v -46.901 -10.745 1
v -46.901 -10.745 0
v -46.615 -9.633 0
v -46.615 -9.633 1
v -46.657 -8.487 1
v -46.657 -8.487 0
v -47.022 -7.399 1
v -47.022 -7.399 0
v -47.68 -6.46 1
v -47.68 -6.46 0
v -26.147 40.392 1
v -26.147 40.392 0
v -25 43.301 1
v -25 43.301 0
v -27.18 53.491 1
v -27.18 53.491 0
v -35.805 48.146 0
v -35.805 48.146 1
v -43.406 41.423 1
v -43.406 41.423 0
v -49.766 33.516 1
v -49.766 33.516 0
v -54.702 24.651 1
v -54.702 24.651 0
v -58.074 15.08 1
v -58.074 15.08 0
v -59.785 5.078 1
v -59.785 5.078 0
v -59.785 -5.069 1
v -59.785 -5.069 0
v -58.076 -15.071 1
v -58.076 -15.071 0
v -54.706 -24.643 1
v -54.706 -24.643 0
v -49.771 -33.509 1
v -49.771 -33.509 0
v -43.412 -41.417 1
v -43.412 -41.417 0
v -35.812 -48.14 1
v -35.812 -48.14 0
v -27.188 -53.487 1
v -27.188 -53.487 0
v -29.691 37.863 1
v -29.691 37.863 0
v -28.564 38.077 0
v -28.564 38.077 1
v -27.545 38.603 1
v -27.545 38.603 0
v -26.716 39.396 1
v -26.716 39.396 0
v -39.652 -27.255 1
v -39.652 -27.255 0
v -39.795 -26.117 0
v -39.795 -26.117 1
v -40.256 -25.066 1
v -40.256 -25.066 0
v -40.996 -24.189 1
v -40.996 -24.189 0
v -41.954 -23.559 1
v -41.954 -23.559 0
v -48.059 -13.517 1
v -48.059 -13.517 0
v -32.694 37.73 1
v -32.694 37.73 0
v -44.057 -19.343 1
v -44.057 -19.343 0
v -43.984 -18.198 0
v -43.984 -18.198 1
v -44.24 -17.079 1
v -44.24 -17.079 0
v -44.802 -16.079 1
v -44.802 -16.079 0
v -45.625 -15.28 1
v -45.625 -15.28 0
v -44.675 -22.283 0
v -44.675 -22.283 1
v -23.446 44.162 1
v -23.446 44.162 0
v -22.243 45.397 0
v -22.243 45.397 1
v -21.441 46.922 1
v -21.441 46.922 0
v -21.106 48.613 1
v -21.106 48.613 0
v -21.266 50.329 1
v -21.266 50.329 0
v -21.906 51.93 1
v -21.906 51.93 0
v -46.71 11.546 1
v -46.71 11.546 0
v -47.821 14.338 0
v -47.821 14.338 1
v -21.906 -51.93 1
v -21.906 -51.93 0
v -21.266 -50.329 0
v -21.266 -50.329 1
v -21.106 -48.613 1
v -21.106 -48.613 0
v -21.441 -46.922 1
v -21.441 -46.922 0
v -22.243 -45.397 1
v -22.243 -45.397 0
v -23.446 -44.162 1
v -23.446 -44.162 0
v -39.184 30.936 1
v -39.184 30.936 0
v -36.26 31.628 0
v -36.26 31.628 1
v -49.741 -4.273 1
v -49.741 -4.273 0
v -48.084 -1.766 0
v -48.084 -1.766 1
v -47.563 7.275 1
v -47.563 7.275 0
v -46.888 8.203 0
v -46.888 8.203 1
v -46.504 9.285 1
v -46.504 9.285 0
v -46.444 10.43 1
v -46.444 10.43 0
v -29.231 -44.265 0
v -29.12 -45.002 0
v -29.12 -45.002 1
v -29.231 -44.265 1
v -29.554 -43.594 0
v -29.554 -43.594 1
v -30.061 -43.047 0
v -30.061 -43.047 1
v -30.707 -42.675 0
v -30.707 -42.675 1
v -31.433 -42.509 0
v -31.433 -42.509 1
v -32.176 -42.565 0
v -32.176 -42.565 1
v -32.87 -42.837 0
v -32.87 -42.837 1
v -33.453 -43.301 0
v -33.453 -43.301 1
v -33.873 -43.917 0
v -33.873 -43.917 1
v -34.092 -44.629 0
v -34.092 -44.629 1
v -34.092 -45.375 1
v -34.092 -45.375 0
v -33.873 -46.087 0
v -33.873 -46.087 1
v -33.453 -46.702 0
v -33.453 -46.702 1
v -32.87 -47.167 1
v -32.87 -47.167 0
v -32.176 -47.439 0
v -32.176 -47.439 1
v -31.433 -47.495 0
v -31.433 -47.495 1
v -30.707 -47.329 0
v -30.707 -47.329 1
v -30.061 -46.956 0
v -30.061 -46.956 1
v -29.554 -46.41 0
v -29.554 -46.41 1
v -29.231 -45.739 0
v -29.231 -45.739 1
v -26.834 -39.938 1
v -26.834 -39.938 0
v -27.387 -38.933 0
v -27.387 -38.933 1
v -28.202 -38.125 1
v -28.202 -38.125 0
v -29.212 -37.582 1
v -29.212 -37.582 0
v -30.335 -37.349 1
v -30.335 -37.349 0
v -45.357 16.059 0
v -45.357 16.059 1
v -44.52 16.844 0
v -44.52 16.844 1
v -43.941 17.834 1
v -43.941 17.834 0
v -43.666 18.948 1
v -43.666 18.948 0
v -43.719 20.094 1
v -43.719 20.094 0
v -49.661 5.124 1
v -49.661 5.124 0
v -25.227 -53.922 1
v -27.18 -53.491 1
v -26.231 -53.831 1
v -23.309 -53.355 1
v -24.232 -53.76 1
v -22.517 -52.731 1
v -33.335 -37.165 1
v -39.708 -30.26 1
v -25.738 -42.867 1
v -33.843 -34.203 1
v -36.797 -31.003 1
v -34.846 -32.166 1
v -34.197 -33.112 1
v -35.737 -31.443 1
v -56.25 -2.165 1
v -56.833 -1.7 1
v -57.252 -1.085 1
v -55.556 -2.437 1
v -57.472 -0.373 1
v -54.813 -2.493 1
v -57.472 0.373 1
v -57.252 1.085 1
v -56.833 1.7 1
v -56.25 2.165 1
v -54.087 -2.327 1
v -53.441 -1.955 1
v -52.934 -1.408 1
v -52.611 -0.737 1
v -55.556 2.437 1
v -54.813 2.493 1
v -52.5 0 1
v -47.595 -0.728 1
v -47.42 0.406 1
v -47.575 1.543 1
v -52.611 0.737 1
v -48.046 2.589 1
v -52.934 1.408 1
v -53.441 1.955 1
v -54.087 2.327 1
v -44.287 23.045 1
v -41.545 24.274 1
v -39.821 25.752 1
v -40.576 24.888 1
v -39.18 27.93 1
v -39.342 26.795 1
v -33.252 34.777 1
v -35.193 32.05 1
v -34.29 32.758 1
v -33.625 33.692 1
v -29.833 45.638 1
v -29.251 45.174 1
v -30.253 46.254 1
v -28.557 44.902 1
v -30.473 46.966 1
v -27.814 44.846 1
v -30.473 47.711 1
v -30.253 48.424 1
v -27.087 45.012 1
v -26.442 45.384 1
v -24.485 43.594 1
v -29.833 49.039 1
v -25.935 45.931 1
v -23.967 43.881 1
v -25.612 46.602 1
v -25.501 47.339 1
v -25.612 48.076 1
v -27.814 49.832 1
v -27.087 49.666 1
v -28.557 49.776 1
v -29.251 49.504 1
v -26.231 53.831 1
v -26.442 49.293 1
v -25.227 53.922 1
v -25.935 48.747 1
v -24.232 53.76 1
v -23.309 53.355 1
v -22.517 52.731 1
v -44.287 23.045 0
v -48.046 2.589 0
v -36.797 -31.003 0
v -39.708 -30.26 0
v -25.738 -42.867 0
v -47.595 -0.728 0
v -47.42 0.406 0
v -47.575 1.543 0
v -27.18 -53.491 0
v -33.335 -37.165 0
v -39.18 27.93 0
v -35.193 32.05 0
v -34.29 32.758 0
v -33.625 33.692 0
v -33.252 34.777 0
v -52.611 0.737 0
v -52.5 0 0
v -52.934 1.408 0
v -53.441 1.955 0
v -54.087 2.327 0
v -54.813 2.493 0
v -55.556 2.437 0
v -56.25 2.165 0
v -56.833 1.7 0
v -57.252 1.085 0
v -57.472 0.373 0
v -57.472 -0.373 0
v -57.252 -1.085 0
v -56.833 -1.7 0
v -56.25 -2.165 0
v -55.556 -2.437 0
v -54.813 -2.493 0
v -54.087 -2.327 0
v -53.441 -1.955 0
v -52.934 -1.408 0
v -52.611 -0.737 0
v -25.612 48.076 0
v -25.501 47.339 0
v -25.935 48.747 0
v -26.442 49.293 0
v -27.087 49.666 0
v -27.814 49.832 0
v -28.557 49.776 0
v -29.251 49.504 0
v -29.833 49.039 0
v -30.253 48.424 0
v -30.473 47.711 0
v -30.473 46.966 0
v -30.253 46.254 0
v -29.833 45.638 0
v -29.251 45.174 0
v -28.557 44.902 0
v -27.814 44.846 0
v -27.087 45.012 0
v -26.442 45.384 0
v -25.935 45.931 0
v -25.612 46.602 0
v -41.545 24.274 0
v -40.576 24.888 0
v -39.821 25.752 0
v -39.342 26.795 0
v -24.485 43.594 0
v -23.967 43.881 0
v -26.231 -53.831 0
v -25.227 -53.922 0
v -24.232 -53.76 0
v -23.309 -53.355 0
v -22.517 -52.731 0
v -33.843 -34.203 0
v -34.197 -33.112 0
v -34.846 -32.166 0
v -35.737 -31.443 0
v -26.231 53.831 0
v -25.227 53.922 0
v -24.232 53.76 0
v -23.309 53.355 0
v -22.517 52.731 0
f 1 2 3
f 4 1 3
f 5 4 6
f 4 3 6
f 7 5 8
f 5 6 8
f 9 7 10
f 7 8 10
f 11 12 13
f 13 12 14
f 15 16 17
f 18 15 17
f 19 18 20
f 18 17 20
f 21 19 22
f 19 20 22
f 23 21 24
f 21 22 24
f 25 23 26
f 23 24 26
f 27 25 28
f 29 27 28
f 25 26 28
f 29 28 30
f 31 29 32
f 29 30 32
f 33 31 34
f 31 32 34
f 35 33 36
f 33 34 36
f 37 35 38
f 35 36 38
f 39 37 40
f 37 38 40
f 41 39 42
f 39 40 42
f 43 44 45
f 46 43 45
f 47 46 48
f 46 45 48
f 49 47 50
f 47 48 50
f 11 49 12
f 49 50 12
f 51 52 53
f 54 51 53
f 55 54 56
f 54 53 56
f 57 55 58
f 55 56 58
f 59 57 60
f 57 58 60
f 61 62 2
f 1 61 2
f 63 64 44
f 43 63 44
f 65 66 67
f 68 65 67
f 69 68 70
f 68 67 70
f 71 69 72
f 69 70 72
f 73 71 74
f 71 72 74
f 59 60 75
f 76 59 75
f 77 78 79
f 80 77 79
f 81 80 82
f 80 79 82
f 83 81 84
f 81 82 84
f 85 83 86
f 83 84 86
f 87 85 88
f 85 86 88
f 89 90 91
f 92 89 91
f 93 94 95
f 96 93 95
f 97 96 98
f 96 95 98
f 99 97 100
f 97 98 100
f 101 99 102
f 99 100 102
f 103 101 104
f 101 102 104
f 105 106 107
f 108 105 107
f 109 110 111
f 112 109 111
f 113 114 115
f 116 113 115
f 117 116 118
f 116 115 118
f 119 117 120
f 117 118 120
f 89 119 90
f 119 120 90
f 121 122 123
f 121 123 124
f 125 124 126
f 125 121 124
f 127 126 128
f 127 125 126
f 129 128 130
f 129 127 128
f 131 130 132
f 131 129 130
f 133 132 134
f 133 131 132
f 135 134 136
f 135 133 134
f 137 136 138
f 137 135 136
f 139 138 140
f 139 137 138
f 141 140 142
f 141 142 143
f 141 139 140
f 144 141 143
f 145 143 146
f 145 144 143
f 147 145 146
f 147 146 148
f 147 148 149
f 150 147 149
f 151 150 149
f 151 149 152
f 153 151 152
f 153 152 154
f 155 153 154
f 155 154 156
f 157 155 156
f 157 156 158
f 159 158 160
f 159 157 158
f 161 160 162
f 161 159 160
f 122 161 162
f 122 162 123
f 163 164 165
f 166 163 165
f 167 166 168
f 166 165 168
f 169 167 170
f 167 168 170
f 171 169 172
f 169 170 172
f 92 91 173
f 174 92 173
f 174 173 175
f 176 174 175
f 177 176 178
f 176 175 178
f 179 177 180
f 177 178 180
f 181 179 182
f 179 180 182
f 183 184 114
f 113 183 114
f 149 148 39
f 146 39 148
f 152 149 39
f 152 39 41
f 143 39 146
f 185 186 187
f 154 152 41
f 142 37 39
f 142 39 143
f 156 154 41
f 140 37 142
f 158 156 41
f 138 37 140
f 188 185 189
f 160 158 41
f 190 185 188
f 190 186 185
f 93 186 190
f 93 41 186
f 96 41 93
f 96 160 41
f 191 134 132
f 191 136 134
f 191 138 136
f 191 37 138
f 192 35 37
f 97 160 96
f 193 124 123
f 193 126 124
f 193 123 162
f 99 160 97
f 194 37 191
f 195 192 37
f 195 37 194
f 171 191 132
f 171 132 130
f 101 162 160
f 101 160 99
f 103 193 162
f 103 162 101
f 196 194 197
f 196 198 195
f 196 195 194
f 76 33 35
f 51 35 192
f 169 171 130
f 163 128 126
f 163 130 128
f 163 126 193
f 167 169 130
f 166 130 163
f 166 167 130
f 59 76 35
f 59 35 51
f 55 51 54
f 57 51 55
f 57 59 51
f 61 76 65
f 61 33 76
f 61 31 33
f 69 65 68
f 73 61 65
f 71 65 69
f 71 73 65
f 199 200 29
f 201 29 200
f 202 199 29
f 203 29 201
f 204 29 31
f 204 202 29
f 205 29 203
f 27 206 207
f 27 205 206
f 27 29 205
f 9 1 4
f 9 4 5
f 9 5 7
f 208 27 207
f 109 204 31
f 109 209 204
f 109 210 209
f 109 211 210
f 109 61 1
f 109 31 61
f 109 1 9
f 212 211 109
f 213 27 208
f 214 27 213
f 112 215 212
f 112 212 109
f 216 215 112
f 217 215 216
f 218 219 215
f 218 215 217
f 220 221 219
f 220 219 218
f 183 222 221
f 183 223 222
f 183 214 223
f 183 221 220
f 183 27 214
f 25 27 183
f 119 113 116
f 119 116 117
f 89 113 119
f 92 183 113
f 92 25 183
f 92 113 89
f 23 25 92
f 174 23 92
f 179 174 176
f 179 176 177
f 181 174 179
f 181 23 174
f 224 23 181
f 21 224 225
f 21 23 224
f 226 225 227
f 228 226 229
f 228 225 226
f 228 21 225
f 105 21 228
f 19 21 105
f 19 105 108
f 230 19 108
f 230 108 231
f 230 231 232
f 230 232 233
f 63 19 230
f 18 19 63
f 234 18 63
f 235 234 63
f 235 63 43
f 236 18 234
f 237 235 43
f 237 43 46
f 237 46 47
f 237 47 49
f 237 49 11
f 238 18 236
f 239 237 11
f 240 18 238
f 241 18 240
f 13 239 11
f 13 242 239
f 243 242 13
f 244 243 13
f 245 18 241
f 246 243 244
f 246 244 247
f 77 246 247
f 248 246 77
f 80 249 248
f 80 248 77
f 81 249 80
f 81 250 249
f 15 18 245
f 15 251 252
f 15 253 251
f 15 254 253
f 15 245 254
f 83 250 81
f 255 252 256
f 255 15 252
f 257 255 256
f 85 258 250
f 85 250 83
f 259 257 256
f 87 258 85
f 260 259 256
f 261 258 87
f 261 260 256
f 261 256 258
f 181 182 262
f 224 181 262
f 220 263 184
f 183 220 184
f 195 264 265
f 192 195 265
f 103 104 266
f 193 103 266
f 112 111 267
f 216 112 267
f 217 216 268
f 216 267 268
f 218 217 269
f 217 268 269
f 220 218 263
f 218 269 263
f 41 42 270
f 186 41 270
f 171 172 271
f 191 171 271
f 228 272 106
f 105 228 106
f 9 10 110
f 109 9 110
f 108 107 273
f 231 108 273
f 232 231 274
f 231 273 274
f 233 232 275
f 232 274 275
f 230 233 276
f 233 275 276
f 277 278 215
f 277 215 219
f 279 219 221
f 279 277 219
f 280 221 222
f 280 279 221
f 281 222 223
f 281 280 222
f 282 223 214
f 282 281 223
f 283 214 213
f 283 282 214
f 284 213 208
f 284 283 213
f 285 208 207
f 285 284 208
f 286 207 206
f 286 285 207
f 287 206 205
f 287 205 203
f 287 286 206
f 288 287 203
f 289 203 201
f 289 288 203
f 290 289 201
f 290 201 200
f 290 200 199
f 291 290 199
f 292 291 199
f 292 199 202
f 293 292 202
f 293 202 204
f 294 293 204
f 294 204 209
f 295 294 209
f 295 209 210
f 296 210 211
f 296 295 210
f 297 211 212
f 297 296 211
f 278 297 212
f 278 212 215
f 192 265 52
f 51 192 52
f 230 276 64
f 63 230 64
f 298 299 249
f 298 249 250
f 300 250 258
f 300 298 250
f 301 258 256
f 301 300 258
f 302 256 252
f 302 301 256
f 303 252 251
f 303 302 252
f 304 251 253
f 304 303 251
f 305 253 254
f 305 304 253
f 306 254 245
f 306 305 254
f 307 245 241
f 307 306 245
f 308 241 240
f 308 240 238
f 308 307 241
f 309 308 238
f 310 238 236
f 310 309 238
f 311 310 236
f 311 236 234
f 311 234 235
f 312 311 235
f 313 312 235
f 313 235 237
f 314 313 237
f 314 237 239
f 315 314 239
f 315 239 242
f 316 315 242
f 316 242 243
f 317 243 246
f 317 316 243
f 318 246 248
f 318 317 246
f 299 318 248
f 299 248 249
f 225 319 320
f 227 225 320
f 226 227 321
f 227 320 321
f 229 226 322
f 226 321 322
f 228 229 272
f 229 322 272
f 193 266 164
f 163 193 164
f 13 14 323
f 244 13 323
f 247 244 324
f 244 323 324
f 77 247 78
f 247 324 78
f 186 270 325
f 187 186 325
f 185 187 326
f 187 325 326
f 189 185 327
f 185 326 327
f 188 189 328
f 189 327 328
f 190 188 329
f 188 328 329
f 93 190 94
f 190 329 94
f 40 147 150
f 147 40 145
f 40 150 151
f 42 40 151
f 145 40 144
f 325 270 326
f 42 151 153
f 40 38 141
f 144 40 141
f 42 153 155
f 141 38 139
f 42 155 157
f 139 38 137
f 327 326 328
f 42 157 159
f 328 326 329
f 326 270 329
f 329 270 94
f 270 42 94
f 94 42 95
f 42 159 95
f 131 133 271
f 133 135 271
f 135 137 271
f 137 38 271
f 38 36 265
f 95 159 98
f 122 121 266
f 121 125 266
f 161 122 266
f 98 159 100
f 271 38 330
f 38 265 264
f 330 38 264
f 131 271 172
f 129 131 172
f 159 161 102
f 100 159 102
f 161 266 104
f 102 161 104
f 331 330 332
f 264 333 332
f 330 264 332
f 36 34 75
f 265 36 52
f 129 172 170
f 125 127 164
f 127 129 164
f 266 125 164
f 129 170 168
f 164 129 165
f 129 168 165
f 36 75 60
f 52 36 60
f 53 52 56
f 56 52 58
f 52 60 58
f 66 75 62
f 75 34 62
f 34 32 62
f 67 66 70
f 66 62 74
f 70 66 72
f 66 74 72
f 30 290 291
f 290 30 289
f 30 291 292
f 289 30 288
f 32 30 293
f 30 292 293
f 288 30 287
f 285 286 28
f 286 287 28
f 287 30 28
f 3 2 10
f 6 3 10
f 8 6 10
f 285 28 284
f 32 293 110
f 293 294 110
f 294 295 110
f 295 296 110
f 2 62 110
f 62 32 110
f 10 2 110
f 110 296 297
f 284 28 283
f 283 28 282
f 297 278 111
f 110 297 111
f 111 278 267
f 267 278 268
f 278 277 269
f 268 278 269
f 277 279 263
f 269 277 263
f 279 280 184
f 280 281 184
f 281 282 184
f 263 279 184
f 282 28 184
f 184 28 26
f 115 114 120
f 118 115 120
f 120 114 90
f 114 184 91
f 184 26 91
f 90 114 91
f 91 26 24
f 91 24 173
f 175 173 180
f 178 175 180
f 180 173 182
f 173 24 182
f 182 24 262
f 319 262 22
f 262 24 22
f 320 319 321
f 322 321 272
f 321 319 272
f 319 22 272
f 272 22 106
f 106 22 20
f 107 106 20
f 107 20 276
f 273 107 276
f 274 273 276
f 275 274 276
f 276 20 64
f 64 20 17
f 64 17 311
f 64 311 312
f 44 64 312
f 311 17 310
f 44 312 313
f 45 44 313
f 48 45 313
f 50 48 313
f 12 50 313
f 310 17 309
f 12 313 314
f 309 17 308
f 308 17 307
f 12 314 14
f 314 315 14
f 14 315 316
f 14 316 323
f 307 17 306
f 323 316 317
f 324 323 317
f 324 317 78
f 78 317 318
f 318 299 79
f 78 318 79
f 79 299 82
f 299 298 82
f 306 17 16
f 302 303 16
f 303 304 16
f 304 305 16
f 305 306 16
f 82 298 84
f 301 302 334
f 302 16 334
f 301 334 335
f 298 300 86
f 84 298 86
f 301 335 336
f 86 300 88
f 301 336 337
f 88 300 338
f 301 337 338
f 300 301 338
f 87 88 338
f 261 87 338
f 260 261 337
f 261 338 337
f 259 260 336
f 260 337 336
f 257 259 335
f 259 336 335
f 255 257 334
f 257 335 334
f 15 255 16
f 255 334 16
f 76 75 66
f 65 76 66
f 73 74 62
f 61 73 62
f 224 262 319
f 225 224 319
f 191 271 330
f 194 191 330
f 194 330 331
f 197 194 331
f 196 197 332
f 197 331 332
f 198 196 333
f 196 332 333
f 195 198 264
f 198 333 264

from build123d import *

# Parameters (mm, degrees)
IZIM1_R                     = 2.5
Y_KSEKLIK_EKSTR_ZYON1_DEPTH = 1


with BuildPart() as part:
    # Çizim1 → Yükseklik-Ekstrüzyon1 (new body)
    with BuildSketch(Plane.XY):
        with BuildLine():
            Line((-23.446136356, -44.161959762), (-25.73775467, -42.866863479))
            Line((-25.73775467, -42.866863479), (-26.834295942, -39.938466016))
            ThreePointArc((-26.834295942, -39.938466016), (-28.201527977, -38.125336415), (-30.335428898, -37.348658075))
            Line((-30.335428898, -37.348658075), (-33.334907776, -37.164700371))
            Line((-33.334907776, -37.164700371), (-33.842709051, -34.202800331))
            ThreePointArc((-33.842709051, -34.202800331), (-34.84597704, -32.165592505), (-36.7965457, -31.002818113))
            Line((-36.7965457, -31.002818113), (-39.708425324, -30.260072511))
            Line((-39.708425324, -30.260072511), (-39.652227319, -27.255483394))
            ThreePointArc((-39.652227319, -27.255483394), (-40.255989993, -25.066366444), (-41.954126526, -23.558687864))
            Line((-41.954126526, -23.558687864), (-44.675252109, -22.283466496))
            Line((-44.675252109, -22.283466496), (-44.057045667, -19.342627369))
            ThreePointArc((-44.057045667, -19.342627369), (-44.239914432, -17.079151855), (-45.625461503, -15.279979352))
            Line((-45.625461503, -15.279979352), (-48.059435816, -13.517457571))
            Line((-48.059435816, -13.517457571), (-46.901121207, -10.744549126))
            ThreePointArc((-46.901121207, -10.744549126), (-46.656617846, -8.486899797), (-47.680491761, -6.459969953))
            Line((-47.680491761, -6.459969953), (-49.741090048, -4.272585973))
            Line((-49.741090048, -4.272585973), (-48.083701146, -1.765839874))
            ThreePointArc((-48.083701146, -1.765839874), (-47.420487313, 0.406004917), (-48.046416828, 2.588887101))
            Line((-48.046416828, 2.588887101), (-49.660641368, 5.123644113))
            Line((-49.660641368, 5.123644113), (-47.562892001, 7.275425136))
            ThreePointArc((-47.562892001, 7.275425136), (-46.504462376, 9.284526705), (-46.710273625, 11.546031539))
            Line((-46.710273625, 11.546031539), (-47.82093971, 14.338366552))
            Line((-47.82093971, 14.338366552), (-45.357143694, 16.058954583))
            ThreePointArc((-45.357143694, 16.058954583), (-43.940993675, 17.834139505), (-43.719395692, 20.094152054))
            Line((-43.719395692, 20.094152054), (-44.287157421, 23.045145208))
            Line((-44.287157421, 23.045145208), (-41.54459596, 24.273587558))
            ThreePointArc((-41.54459596, 24.273587558), (-39.820893366, 25.751969023), (-39.17973637, 27.930427214))
            Line((-39.17973637, 27.930427214), (-39.184480502, 30.935538106))
            Line((-39.184480502, 30.935538106), (-36.260310201, 31.628316593))
            ThreePointArc((-36.260310201, 31.628316593), (-34.290118058, 32.757522199), (-33.252115355, 34.777253066))
            Line((-33.252115355, 34.777253066), (-32.693673826, 37.730024144))
            Line((-32.693673826, 37.730024144), (-29.691484877, 37.862596744))
            ThreePointArc((-29.691484877, 37.862596744), (-27.544598222, 38.602623821), (-26.146521576, 40.39207739))
            Line((-26.146521576, 40.39207739), (-25, 43.301270189))
            ThreePointArc((-25, 43.301270189), (-24.226890609, 43.73851588), (-23.446136356, 44.161959762))
            ThreePointArc((-23.446136356, 44.161959762), (-21.212806241, 47.755648425), (-21.906244367, 51.929556087))
            ThreePointArc((-21.906244367, 51.929556087), (-24.232021318, 53.76021953), (-27.179564099, 53.490852446))
            ThreePointArc((-27.179564099, 53.490852446), (-59.999999835, 0.004450967), (-27.1875, -53.486819346))
            Line((-27.1875, -53.486819346), (-27.179564099, -53.490852446))
            ThreePointArc((-27.179564099, -53.490852446), (-24.232021318, -53.76021953), (-21.906244367, -51.929556087))
            ThreePointArc((-21.906244367, -51.929556087), (-21.212806241, -47.755648425), (-23.446136356, -44.161959762))
        make_face()
        with Locations((-31.620079453, -45.001895242)):
            Circle(IZIM1_R, mode=Mode.SUBTRACT)
        with Locations((-55, 0)):
            Circle(IZIM1_R, mode=Mode.SUBTRACT)
        with Locations((-28.000624989, 47.338831842)):
            Circle(IZIM1_R, mode=Mode.SUBTRACT)
    extrude(amount=Y_KSEKLIK_EKSTR_ZYON1_DEPTH)


solid = part.part
